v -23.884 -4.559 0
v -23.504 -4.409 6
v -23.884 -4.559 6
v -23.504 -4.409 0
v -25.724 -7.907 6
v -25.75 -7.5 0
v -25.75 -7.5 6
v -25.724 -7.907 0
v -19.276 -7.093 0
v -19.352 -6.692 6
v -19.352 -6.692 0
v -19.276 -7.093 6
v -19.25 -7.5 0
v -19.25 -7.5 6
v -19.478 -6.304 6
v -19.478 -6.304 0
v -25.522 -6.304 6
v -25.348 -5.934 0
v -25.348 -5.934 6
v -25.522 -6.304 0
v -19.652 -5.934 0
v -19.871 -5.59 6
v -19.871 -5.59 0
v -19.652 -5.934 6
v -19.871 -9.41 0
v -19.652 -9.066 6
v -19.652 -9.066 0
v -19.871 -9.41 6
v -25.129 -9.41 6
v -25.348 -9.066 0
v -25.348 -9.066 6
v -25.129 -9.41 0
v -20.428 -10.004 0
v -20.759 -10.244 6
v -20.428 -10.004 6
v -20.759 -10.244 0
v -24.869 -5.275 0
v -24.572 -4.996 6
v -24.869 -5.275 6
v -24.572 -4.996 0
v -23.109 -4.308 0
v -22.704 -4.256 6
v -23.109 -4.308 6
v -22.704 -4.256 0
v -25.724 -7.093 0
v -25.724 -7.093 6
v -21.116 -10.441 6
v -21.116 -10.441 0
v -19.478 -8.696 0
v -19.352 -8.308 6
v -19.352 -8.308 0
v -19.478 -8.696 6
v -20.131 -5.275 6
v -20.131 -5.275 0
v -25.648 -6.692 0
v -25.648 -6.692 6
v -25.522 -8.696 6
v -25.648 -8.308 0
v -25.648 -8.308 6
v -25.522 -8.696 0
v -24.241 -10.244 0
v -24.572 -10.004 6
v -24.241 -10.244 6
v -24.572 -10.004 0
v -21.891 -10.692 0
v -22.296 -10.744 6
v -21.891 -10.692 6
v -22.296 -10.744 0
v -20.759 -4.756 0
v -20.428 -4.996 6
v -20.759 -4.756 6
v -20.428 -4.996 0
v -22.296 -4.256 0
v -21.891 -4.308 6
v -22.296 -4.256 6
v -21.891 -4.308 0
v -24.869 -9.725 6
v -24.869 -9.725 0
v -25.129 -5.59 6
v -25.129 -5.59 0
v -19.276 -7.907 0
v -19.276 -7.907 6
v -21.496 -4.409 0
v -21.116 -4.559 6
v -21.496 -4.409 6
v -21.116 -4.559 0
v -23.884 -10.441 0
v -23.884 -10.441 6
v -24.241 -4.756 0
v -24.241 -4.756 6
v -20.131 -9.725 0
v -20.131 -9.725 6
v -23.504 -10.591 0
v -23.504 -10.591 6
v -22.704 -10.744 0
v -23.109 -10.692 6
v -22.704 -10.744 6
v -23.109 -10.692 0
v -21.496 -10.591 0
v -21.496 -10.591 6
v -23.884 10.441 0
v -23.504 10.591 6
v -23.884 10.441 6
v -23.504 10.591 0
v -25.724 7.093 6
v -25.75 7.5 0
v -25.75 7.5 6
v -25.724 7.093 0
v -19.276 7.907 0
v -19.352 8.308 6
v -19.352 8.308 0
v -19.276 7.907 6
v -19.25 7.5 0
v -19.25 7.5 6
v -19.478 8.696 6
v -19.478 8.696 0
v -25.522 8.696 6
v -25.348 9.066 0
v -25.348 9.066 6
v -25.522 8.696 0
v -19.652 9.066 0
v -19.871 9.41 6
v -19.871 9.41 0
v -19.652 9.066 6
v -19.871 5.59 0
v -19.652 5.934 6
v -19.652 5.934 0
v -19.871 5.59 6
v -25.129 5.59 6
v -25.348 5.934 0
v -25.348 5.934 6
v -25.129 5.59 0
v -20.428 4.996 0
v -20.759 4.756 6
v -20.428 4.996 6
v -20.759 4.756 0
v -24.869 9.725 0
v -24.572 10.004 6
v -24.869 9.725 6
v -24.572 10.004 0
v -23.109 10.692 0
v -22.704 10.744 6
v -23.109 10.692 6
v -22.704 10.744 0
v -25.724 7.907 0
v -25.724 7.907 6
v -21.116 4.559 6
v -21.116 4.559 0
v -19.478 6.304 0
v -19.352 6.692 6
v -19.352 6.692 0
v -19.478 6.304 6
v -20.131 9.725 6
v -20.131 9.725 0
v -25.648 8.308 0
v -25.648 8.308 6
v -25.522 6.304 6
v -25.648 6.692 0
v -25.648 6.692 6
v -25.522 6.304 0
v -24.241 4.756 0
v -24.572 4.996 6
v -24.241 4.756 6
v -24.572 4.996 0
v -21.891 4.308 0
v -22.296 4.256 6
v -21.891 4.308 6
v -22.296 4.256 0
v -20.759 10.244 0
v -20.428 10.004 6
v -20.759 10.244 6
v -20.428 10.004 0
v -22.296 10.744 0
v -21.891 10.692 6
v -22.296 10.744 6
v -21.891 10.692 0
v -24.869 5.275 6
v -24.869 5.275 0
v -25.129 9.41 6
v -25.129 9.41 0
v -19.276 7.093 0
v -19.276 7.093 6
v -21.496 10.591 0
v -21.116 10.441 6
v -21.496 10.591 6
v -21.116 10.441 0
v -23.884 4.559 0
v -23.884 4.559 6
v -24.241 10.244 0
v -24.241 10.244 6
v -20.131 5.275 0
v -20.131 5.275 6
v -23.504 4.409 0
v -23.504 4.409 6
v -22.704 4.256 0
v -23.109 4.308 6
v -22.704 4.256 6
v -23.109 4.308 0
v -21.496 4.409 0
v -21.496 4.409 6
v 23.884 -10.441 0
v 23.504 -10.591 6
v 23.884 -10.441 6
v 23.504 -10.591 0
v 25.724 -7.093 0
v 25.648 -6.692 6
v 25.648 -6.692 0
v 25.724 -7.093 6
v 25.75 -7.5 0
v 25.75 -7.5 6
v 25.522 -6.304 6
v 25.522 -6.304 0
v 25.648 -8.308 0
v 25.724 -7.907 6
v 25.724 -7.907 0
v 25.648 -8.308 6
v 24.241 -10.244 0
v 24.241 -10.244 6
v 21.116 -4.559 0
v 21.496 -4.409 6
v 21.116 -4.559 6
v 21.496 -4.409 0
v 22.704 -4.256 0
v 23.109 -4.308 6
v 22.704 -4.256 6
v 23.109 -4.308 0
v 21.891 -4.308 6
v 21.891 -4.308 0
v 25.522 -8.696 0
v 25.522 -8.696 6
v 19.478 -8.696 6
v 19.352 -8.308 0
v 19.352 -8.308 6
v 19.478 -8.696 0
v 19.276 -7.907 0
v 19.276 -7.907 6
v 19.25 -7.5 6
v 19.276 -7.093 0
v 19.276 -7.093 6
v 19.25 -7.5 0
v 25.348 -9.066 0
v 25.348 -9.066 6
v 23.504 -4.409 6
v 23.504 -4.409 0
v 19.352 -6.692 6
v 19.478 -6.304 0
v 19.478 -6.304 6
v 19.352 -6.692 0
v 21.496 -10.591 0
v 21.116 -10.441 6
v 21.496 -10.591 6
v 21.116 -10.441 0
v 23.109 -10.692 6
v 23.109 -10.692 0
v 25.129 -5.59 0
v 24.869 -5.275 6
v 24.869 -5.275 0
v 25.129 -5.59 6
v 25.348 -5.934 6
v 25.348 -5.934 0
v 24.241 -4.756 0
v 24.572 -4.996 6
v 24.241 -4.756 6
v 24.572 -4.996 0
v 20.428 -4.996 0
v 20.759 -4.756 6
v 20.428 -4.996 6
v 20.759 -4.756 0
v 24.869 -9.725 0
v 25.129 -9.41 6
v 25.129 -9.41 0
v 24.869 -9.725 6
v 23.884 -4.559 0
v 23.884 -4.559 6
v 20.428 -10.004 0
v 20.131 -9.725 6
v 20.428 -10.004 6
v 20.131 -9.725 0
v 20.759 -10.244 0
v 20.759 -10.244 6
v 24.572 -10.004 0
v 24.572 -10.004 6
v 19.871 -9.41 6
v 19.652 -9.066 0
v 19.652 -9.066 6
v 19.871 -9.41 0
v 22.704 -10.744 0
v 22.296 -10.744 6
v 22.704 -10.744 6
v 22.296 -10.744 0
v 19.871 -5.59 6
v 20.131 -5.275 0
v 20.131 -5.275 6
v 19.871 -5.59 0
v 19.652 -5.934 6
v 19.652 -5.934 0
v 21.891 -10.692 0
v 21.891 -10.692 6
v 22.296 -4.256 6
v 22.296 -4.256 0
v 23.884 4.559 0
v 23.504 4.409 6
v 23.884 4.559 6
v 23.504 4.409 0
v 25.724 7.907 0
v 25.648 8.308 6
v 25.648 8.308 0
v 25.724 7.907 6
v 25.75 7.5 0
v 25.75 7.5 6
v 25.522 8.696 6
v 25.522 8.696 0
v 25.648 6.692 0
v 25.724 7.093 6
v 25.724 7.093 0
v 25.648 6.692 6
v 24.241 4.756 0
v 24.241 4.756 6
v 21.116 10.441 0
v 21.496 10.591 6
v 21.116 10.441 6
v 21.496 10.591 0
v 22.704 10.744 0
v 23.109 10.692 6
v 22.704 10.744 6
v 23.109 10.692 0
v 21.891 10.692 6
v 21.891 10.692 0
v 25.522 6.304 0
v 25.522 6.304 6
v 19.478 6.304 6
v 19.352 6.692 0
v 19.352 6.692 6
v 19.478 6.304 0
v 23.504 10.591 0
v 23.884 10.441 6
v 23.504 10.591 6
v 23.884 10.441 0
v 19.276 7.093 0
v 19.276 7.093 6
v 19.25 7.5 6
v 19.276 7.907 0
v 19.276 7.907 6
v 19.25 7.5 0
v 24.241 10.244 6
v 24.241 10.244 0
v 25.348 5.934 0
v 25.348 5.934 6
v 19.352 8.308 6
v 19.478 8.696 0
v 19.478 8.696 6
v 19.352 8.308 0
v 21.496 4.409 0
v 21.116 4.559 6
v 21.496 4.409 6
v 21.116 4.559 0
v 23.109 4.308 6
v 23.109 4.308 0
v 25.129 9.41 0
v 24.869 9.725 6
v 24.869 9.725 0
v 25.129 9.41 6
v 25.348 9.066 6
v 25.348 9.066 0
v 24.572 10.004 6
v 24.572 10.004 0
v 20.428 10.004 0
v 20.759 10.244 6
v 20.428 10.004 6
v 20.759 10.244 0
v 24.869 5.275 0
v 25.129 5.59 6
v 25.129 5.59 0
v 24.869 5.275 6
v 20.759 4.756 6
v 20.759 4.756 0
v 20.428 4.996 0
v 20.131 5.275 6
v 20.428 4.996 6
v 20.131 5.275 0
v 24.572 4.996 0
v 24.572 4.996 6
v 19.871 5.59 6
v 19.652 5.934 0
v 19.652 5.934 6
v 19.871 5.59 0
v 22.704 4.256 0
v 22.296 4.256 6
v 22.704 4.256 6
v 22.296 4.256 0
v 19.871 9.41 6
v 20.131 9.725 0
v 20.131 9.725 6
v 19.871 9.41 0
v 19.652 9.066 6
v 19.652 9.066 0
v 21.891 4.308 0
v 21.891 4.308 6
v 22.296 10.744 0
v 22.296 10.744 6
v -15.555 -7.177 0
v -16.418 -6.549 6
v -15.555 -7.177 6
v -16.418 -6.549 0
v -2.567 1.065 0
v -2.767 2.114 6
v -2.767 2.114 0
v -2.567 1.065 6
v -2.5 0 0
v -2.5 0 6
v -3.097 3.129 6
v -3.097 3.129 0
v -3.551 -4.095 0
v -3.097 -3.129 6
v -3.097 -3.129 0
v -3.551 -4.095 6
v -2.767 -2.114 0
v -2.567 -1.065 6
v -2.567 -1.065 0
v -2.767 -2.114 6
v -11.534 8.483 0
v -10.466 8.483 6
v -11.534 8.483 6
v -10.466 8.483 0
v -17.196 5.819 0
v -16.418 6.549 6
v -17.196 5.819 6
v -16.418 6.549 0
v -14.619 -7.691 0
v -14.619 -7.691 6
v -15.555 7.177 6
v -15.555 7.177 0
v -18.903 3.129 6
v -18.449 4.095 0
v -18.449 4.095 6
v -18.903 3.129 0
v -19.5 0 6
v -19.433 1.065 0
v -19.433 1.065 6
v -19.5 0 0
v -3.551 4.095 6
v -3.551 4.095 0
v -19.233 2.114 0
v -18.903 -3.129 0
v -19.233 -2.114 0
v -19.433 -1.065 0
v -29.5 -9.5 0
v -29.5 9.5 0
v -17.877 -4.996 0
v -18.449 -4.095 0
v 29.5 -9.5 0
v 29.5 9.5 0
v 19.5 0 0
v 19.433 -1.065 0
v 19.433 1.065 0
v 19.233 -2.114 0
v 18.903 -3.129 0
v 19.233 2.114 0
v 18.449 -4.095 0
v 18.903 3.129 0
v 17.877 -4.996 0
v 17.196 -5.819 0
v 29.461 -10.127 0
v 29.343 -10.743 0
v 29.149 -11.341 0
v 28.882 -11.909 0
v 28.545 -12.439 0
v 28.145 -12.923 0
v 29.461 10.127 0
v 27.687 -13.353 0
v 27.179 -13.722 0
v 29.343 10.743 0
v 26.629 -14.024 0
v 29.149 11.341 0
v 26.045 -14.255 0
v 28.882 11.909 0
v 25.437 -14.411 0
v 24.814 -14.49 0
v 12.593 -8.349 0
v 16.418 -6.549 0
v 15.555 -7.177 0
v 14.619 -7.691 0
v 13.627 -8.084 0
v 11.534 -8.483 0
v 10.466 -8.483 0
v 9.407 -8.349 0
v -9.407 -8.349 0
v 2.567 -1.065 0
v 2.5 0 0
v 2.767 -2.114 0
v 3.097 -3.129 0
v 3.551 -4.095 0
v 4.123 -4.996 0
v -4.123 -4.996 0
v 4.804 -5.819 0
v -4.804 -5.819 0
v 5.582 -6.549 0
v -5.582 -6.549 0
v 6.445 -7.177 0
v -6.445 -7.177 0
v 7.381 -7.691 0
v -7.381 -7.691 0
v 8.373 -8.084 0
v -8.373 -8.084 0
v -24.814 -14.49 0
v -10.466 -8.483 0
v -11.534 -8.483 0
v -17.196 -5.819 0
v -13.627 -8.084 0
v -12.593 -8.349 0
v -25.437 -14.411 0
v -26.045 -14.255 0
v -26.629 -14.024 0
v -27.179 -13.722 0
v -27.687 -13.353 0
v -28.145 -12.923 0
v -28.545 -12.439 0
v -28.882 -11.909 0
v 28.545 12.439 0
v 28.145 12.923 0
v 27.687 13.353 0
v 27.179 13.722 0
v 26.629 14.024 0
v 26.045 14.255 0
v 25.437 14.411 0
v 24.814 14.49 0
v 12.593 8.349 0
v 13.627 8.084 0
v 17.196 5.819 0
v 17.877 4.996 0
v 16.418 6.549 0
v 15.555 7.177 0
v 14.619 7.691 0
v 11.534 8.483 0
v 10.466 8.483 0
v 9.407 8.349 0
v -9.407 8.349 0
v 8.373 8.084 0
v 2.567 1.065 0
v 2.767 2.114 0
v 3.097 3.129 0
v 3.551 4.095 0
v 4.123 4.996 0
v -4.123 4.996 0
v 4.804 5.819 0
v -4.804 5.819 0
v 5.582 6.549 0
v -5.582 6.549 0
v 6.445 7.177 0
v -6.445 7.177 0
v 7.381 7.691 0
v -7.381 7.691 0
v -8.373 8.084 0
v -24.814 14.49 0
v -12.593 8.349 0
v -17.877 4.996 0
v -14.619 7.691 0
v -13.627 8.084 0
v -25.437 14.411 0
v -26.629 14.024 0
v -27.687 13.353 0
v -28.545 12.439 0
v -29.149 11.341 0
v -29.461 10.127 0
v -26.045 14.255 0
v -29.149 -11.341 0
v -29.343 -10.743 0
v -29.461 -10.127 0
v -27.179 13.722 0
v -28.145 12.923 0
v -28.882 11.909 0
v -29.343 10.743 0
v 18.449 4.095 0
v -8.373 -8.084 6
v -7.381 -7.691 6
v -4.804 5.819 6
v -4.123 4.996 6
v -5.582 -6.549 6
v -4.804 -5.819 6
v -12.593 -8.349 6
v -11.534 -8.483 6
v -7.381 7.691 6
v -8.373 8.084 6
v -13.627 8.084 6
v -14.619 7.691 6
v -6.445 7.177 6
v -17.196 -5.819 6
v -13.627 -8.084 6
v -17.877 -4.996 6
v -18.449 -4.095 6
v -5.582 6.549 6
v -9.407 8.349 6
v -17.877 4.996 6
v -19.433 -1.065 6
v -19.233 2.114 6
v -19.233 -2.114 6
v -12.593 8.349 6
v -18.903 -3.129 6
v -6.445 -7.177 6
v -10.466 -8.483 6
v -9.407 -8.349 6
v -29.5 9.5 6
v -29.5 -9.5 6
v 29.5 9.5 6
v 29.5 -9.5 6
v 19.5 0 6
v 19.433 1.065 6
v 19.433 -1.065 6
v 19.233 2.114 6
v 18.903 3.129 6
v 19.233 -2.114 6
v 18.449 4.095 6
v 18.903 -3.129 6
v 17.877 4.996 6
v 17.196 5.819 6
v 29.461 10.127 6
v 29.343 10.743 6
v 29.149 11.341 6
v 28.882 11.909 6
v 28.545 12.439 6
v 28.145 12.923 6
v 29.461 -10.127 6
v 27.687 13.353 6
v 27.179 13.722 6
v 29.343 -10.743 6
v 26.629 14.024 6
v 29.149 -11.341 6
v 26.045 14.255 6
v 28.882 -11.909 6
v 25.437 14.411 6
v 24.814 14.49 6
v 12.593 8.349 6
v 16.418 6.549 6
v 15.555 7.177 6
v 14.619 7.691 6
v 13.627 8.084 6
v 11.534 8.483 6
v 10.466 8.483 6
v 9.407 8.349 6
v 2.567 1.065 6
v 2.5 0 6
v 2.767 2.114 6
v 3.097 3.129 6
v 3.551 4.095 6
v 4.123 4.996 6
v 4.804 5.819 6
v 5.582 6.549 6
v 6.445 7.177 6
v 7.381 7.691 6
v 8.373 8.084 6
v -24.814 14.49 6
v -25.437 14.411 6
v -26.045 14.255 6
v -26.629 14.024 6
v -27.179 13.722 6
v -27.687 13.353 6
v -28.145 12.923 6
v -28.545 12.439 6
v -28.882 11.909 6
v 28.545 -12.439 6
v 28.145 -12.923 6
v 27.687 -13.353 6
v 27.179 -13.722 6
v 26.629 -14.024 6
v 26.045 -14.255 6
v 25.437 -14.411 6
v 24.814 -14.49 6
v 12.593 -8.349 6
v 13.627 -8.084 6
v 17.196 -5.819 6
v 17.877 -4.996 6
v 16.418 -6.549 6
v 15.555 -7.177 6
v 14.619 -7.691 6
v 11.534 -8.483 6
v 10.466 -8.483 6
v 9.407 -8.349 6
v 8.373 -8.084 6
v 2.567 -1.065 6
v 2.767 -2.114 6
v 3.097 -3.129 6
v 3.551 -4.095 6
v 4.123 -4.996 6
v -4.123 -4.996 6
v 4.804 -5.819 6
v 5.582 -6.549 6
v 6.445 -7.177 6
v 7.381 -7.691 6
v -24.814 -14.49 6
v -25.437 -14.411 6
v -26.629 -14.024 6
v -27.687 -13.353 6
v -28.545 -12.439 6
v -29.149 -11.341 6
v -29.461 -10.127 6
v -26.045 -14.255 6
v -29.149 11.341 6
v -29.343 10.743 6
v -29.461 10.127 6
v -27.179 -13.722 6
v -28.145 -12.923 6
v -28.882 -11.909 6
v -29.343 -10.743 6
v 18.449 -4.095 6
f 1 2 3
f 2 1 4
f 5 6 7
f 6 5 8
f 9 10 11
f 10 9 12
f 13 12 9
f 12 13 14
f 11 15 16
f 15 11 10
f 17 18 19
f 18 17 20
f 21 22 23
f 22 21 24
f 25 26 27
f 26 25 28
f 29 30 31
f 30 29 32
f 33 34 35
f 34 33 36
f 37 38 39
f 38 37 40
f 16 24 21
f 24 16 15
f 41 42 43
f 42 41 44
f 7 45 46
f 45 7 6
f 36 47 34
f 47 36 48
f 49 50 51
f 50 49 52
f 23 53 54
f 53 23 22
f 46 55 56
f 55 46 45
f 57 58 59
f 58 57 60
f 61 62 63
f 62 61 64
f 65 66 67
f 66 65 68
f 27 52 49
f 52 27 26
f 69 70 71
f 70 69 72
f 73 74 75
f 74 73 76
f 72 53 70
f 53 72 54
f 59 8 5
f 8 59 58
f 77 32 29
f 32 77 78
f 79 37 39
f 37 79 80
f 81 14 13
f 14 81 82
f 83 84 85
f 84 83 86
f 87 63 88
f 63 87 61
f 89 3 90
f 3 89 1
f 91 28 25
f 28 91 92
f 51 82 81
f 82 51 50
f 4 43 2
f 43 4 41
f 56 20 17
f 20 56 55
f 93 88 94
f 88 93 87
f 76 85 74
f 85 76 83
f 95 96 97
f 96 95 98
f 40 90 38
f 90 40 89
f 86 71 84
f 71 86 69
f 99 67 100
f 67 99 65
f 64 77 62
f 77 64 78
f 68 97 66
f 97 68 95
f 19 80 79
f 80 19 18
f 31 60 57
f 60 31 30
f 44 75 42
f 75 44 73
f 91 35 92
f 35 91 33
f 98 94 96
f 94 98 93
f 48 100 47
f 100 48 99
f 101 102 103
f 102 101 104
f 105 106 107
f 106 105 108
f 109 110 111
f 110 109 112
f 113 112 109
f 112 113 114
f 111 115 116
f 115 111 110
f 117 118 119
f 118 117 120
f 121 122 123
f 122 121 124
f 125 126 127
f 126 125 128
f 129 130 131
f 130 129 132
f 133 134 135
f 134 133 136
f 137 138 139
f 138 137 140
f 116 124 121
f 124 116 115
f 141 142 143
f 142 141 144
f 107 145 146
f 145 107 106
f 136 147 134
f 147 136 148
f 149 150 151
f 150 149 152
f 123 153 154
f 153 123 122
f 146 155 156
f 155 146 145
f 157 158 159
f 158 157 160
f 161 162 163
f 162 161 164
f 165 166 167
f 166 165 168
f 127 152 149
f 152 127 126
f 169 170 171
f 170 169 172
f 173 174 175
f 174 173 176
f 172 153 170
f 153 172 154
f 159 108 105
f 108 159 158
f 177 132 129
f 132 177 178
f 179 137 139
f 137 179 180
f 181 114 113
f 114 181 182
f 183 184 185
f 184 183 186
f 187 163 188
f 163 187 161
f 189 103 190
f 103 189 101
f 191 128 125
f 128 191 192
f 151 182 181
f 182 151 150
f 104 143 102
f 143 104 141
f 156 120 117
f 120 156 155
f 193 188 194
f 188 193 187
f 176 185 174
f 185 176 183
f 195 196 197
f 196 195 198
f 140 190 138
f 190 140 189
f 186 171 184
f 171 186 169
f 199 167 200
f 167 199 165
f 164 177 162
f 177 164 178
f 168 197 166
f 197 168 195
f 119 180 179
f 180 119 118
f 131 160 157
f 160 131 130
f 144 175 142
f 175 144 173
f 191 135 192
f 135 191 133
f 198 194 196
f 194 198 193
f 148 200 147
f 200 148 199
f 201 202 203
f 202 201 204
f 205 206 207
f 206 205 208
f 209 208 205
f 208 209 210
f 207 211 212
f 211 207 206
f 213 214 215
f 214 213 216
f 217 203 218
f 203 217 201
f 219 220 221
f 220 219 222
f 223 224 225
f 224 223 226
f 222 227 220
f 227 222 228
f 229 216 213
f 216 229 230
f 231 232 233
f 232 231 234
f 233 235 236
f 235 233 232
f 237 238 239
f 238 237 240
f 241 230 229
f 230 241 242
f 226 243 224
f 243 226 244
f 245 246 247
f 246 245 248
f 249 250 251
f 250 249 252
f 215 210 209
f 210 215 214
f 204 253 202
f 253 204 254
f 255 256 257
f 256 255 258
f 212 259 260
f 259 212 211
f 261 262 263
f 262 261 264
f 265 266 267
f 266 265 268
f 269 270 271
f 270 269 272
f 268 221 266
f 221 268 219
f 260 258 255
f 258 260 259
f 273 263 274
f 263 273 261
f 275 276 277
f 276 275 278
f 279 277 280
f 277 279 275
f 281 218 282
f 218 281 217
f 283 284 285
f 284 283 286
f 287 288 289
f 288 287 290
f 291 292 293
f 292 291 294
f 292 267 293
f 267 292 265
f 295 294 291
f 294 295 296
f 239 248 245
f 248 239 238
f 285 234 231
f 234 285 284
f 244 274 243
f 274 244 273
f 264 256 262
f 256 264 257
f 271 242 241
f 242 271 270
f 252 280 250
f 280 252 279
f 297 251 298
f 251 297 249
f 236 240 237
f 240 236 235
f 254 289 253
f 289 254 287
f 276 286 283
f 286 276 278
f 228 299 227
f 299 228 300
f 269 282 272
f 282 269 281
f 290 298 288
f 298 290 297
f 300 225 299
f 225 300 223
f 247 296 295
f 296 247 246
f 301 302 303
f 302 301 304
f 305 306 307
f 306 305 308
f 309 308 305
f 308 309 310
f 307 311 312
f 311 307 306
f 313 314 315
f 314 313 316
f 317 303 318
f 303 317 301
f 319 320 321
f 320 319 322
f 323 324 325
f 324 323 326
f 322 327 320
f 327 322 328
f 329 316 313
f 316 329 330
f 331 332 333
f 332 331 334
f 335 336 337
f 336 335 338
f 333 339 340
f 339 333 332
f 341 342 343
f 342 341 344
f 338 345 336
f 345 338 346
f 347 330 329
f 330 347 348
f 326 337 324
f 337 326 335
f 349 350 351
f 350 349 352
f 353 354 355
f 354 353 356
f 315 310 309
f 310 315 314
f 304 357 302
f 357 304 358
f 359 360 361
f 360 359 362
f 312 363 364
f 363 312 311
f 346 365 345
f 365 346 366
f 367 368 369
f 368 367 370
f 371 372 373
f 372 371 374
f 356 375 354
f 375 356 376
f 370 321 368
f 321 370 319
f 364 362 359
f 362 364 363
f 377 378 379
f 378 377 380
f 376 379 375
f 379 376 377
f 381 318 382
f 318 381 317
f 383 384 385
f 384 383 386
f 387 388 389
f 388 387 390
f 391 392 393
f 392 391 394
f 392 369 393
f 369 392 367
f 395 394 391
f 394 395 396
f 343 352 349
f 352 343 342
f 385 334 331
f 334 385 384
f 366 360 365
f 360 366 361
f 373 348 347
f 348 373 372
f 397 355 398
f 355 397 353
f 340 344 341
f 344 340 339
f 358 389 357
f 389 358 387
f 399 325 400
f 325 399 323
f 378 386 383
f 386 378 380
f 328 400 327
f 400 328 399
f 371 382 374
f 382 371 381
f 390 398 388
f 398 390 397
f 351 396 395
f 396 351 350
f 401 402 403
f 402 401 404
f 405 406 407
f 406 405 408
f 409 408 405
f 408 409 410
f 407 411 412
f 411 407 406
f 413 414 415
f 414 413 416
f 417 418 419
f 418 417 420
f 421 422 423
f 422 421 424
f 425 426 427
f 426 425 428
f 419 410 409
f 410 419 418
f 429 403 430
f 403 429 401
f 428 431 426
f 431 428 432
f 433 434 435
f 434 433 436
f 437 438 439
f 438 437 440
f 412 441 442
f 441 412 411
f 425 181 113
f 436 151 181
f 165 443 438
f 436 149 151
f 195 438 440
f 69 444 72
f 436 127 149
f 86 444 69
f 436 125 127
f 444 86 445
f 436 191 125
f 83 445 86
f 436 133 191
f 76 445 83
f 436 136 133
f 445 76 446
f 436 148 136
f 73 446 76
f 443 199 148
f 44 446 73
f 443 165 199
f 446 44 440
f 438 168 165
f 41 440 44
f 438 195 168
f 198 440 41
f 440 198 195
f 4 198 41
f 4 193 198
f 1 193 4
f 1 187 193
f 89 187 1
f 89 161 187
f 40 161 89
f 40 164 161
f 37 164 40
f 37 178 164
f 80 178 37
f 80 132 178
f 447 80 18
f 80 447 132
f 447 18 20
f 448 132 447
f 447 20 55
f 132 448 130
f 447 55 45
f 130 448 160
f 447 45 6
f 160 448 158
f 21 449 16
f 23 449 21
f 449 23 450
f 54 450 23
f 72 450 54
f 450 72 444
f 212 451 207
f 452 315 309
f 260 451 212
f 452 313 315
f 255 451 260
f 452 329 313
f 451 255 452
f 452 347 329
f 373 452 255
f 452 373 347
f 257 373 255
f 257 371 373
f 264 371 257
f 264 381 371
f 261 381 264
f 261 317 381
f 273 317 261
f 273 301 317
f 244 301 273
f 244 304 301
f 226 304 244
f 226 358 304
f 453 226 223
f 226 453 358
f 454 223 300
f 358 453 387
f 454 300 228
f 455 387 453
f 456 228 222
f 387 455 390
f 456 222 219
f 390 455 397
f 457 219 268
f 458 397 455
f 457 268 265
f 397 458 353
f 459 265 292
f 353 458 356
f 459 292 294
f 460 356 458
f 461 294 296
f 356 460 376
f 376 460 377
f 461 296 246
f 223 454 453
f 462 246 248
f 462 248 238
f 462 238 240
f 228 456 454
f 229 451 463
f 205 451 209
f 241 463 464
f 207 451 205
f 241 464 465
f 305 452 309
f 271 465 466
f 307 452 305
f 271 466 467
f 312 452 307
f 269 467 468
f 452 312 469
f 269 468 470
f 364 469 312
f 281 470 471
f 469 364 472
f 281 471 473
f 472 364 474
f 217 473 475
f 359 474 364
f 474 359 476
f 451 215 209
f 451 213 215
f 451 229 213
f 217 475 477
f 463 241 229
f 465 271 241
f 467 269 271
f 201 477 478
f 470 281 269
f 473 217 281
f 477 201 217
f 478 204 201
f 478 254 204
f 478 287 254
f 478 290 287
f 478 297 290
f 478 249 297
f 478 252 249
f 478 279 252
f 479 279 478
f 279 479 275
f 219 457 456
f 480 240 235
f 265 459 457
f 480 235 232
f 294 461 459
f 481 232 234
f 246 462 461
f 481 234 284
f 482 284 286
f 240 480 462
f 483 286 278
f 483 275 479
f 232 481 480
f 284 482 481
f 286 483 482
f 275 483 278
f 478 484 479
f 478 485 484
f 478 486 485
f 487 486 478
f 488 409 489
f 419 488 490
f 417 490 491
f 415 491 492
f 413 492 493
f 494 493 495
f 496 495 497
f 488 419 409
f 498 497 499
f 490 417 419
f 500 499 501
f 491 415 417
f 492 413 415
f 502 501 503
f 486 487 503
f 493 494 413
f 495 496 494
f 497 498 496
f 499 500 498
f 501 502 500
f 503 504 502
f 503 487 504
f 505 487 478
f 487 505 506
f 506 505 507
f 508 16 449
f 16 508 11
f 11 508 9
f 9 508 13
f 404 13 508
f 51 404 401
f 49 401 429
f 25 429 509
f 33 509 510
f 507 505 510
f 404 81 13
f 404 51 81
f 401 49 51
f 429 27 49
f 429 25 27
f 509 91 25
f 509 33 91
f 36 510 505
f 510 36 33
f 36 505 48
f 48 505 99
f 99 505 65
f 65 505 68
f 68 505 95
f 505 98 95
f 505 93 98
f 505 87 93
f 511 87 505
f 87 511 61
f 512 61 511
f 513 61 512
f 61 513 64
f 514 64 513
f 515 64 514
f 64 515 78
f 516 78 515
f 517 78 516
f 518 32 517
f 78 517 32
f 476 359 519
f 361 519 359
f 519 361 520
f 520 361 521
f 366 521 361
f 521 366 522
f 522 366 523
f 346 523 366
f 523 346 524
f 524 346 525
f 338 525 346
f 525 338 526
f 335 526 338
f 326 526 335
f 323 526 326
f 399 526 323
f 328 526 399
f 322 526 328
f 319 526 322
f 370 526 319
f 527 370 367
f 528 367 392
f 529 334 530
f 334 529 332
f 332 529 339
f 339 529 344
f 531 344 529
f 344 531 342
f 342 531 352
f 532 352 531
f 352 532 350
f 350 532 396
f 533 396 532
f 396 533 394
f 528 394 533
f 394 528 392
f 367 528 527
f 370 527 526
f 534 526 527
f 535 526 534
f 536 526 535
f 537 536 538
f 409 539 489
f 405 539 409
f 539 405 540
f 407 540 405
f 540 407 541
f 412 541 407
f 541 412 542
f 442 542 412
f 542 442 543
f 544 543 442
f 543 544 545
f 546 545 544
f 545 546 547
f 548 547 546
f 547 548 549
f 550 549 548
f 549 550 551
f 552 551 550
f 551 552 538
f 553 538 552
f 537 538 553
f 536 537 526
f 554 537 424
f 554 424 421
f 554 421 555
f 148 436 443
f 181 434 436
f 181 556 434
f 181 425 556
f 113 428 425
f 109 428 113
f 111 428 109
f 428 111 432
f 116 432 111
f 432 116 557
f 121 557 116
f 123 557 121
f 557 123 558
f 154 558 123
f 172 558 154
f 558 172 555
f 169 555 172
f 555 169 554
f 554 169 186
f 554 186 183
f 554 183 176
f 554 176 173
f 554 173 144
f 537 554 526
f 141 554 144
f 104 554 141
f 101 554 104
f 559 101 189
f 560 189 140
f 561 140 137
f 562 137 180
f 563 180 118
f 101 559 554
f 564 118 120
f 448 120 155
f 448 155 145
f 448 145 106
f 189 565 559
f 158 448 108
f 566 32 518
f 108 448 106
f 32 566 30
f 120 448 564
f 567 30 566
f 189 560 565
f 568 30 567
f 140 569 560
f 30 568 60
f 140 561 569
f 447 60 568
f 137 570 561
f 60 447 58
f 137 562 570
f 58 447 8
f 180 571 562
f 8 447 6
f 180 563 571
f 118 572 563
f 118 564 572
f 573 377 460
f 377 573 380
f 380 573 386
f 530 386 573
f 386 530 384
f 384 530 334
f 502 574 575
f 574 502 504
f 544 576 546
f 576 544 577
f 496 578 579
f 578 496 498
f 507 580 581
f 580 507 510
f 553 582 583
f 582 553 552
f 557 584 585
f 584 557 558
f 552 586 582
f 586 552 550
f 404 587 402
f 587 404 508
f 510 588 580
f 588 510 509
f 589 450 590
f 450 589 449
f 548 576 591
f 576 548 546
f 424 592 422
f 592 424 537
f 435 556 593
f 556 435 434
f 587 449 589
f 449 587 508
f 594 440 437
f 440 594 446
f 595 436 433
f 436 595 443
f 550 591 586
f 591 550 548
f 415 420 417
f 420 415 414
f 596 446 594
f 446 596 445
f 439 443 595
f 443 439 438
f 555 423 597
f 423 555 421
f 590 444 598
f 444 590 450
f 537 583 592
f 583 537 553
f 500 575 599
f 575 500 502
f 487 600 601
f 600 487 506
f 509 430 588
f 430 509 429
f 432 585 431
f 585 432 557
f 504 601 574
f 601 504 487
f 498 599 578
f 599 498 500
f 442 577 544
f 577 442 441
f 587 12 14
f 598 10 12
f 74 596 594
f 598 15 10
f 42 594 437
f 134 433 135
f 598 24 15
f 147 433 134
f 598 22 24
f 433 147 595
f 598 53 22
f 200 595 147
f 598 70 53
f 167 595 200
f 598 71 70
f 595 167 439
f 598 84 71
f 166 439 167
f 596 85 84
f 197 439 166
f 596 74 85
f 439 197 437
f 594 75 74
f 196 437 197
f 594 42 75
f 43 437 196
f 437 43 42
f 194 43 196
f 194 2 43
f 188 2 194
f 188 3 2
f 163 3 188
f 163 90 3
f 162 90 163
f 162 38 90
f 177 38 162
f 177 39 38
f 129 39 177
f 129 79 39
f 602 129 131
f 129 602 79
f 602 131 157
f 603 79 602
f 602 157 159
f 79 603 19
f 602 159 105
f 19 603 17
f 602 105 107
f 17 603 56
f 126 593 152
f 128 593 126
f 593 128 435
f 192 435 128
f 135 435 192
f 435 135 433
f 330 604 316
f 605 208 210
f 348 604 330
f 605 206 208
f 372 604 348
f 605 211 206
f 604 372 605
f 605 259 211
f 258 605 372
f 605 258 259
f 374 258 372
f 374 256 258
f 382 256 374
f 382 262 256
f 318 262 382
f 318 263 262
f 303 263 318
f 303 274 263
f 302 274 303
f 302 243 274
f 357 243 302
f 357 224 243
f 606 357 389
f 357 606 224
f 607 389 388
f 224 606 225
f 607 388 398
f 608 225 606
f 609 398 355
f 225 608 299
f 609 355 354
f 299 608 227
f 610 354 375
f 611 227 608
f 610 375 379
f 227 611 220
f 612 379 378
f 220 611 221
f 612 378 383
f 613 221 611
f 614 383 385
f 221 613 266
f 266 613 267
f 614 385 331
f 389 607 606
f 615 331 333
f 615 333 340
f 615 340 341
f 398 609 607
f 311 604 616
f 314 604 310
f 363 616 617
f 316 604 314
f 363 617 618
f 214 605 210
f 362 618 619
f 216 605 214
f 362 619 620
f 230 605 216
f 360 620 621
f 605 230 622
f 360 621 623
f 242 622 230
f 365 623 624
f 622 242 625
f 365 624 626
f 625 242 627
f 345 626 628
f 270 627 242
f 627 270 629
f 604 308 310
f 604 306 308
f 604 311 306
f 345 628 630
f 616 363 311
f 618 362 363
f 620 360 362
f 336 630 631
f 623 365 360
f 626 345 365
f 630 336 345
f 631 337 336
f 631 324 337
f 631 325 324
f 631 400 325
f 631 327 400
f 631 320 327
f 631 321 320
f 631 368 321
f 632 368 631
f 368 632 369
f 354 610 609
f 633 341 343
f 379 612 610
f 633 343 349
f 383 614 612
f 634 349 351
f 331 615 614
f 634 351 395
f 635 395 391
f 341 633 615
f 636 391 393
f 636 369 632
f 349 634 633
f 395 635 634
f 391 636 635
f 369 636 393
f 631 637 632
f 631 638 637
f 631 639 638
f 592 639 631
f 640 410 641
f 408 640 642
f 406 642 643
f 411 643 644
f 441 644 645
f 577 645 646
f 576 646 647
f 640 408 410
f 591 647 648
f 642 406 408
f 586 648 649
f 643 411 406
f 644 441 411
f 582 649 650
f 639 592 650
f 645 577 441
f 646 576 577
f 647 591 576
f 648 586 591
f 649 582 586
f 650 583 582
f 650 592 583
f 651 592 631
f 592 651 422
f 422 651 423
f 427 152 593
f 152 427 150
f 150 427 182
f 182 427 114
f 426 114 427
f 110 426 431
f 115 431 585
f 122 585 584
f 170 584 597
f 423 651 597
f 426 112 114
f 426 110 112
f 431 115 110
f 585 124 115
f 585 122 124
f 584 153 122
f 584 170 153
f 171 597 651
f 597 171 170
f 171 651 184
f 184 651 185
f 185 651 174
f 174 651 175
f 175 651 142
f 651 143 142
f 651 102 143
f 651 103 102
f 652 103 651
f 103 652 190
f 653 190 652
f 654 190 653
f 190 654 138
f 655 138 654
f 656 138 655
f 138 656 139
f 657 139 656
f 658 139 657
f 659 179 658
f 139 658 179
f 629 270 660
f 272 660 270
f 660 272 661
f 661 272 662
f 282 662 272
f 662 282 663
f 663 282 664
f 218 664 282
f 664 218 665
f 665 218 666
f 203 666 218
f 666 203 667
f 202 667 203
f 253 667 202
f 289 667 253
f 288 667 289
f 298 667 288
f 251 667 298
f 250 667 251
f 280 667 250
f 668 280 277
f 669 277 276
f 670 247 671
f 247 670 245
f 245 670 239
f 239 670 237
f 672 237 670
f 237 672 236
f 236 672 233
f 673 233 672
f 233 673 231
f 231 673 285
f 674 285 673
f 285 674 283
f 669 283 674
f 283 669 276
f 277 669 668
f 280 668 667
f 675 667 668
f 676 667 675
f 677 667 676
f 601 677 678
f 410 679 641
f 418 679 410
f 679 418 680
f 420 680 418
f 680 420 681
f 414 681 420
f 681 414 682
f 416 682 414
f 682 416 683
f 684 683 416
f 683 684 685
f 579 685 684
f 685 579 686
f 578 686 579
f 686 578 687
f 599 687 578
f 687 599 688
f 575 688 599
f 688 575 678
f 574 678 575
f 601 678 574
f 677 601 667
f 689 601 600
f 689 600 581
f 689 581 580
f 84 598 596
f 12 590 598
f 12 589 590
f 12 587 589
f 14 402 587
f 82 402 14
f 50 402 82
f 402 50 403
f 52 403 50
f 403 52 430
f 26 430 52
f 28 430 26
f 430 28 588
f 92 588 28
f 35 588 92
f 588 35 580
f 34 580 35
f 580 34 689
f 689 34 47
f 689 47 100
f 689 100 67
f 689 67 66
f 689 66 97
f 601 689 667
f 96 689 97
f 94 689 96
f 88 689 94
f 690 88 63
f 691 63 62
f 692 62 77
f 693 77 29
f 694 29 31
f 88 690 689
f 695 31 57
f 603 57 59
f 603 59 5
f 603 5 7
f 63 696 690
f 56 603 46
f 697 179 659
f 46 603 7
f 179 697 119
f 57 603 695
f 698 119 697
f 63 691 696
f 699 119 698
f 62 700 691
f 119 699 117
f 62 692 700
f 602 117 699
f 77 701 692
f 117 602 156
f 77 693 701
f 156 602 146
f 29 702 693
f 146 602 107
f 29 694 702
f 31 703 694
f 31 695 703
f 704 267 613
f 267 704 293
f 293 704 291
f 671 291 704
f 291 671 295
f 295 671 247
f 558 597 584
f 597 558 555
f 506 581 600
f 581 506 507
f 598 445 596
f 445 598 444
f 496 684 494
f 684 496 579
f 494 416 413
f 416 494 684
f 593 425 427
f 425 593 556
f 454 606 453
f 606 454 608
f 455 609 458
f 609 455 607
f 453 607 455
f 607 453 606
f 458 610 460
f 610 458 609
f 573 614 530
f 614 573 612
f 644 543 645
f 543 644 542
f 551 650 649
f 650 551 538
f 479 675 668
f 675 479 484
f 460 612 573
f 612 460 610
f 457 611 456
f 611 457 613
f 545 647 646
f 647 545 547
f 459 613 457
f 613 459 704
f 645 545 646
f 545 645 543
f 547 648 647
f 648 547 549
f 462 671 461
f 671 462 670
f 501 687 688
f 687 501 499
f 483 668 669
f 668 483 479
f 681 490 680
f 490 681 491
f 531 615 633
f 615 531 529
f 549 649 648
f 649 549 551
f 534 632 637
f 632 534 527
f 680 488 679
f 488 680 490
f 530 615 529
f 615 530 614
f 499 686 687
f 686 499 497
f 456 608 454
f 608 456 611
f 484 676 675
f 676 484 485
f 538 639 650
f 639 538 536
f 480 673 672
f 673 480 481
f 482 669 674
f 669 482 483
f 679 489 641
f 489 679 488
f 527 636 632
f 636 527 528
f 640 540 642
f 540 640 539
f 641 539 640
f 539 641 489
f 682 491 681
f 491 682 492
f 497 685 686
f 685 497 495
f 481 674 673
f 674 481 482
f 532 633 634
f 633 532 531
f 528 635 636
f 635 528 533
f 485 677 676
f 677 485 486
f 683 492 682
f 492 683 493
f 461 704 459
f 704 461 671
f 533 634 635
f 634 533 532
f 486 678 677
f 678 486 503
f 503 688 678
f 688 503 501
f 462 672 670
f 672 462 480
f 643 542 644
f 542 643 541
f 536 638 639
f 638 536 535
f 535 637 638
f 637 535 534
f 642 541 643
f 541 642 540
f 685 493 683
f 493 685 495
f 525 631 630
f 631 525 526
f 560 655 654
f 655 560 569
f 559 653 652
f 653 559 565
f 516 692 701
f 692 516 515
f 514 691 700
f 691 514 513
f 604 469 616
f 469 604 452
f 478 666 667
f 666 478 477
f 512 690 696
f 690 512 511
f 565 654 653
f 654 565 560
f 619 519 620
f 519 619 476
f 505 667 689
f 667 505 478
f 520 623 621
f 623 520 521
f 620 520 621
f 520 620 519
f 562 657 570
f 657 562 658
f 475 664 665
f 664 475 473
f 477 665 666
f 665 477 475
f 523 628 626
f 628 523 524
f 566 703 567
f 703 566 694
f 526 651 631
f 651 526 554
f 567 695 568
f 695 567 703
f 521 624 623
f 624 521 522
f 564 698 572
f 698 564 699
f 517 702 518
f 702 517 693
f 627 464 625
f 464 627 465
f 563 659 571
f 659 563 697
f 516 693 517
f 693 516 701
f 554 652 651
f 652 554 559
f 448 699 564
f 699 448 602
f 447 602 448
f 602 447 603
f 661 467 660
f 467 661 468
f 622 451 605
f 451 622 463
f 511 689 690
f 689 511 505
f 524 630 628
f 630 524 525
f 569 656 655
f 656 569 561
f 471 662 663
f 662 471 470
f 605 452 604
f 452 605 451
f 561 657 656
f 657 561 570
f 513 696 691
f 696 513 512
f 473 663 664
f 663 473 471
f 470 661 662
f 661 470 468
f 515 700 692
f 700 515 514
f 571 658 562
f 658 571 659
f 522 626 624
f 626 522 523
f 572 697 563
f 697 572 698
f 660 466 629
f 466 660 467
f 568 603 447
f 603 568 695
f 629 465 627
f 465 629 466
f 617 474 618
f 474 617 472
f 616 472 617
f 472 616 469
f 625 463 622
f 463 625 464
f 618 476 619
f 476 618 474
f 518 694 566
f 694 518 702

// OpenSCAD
$fn = 50;

difference() {
	union() {
		hull() {
			translate(v = [-24.5, 9.5, 0]) {
				cylinder(h = 6, r = 5);
			}
			translate(v = [24.5, 9.5, 0]) {
				cylinder(h = 6, r = 5);
			}
			translate(v = [-24.5, -9.5, 0]) {
				cylinder(h = 6, r = 5);
			}
			translate(v = [24.5, -9.5, 0]) {
				cylinder(h = 6, r = 5);
			}
		}
	}
	union() {
		translate(v = [-22.5, -7.5, -100.0]) {
			cylinder(h = 200, r = 3.25);
		}
		translate(v = [-22.5, 7.5, -100.0]) {
			cylinder(h = 200, r = 3.25);
		}
		translate(v = [22.5, -7.5, -100.0]) {
			cylinder(h = 200, r = 3.25);
		}
		translate(v = [22.5, 7.5, -100.0]) {
			cylinder(h = 200, r = 3.25);
		}
		translate(v = [-22.5, -7.5, -100.0]) {
			cylinder(h = 200, r = 1.8);
		}
		translate(v = [-22.5, 7.5, -100.0]) {
			cylinder(h = 200, r = 1.8);
		}
		translate(v = [22.5, -7.5, -100.0]) {
			cylinder(h = 200, r = 1.8);
		}
		translate(v = [22.5, 7.5, -100.0]) {
			cylinder(h = 200, r = 1.8);
		}
		translate(v = [-11.0, 0, 0.0]) {
			cylinder(h = 6, r = 8.5);
		}
		translate(v = [11.0, 0, 0.0]) {
			cylinder(h = 6, r = 8.5);
		}
	}
}
